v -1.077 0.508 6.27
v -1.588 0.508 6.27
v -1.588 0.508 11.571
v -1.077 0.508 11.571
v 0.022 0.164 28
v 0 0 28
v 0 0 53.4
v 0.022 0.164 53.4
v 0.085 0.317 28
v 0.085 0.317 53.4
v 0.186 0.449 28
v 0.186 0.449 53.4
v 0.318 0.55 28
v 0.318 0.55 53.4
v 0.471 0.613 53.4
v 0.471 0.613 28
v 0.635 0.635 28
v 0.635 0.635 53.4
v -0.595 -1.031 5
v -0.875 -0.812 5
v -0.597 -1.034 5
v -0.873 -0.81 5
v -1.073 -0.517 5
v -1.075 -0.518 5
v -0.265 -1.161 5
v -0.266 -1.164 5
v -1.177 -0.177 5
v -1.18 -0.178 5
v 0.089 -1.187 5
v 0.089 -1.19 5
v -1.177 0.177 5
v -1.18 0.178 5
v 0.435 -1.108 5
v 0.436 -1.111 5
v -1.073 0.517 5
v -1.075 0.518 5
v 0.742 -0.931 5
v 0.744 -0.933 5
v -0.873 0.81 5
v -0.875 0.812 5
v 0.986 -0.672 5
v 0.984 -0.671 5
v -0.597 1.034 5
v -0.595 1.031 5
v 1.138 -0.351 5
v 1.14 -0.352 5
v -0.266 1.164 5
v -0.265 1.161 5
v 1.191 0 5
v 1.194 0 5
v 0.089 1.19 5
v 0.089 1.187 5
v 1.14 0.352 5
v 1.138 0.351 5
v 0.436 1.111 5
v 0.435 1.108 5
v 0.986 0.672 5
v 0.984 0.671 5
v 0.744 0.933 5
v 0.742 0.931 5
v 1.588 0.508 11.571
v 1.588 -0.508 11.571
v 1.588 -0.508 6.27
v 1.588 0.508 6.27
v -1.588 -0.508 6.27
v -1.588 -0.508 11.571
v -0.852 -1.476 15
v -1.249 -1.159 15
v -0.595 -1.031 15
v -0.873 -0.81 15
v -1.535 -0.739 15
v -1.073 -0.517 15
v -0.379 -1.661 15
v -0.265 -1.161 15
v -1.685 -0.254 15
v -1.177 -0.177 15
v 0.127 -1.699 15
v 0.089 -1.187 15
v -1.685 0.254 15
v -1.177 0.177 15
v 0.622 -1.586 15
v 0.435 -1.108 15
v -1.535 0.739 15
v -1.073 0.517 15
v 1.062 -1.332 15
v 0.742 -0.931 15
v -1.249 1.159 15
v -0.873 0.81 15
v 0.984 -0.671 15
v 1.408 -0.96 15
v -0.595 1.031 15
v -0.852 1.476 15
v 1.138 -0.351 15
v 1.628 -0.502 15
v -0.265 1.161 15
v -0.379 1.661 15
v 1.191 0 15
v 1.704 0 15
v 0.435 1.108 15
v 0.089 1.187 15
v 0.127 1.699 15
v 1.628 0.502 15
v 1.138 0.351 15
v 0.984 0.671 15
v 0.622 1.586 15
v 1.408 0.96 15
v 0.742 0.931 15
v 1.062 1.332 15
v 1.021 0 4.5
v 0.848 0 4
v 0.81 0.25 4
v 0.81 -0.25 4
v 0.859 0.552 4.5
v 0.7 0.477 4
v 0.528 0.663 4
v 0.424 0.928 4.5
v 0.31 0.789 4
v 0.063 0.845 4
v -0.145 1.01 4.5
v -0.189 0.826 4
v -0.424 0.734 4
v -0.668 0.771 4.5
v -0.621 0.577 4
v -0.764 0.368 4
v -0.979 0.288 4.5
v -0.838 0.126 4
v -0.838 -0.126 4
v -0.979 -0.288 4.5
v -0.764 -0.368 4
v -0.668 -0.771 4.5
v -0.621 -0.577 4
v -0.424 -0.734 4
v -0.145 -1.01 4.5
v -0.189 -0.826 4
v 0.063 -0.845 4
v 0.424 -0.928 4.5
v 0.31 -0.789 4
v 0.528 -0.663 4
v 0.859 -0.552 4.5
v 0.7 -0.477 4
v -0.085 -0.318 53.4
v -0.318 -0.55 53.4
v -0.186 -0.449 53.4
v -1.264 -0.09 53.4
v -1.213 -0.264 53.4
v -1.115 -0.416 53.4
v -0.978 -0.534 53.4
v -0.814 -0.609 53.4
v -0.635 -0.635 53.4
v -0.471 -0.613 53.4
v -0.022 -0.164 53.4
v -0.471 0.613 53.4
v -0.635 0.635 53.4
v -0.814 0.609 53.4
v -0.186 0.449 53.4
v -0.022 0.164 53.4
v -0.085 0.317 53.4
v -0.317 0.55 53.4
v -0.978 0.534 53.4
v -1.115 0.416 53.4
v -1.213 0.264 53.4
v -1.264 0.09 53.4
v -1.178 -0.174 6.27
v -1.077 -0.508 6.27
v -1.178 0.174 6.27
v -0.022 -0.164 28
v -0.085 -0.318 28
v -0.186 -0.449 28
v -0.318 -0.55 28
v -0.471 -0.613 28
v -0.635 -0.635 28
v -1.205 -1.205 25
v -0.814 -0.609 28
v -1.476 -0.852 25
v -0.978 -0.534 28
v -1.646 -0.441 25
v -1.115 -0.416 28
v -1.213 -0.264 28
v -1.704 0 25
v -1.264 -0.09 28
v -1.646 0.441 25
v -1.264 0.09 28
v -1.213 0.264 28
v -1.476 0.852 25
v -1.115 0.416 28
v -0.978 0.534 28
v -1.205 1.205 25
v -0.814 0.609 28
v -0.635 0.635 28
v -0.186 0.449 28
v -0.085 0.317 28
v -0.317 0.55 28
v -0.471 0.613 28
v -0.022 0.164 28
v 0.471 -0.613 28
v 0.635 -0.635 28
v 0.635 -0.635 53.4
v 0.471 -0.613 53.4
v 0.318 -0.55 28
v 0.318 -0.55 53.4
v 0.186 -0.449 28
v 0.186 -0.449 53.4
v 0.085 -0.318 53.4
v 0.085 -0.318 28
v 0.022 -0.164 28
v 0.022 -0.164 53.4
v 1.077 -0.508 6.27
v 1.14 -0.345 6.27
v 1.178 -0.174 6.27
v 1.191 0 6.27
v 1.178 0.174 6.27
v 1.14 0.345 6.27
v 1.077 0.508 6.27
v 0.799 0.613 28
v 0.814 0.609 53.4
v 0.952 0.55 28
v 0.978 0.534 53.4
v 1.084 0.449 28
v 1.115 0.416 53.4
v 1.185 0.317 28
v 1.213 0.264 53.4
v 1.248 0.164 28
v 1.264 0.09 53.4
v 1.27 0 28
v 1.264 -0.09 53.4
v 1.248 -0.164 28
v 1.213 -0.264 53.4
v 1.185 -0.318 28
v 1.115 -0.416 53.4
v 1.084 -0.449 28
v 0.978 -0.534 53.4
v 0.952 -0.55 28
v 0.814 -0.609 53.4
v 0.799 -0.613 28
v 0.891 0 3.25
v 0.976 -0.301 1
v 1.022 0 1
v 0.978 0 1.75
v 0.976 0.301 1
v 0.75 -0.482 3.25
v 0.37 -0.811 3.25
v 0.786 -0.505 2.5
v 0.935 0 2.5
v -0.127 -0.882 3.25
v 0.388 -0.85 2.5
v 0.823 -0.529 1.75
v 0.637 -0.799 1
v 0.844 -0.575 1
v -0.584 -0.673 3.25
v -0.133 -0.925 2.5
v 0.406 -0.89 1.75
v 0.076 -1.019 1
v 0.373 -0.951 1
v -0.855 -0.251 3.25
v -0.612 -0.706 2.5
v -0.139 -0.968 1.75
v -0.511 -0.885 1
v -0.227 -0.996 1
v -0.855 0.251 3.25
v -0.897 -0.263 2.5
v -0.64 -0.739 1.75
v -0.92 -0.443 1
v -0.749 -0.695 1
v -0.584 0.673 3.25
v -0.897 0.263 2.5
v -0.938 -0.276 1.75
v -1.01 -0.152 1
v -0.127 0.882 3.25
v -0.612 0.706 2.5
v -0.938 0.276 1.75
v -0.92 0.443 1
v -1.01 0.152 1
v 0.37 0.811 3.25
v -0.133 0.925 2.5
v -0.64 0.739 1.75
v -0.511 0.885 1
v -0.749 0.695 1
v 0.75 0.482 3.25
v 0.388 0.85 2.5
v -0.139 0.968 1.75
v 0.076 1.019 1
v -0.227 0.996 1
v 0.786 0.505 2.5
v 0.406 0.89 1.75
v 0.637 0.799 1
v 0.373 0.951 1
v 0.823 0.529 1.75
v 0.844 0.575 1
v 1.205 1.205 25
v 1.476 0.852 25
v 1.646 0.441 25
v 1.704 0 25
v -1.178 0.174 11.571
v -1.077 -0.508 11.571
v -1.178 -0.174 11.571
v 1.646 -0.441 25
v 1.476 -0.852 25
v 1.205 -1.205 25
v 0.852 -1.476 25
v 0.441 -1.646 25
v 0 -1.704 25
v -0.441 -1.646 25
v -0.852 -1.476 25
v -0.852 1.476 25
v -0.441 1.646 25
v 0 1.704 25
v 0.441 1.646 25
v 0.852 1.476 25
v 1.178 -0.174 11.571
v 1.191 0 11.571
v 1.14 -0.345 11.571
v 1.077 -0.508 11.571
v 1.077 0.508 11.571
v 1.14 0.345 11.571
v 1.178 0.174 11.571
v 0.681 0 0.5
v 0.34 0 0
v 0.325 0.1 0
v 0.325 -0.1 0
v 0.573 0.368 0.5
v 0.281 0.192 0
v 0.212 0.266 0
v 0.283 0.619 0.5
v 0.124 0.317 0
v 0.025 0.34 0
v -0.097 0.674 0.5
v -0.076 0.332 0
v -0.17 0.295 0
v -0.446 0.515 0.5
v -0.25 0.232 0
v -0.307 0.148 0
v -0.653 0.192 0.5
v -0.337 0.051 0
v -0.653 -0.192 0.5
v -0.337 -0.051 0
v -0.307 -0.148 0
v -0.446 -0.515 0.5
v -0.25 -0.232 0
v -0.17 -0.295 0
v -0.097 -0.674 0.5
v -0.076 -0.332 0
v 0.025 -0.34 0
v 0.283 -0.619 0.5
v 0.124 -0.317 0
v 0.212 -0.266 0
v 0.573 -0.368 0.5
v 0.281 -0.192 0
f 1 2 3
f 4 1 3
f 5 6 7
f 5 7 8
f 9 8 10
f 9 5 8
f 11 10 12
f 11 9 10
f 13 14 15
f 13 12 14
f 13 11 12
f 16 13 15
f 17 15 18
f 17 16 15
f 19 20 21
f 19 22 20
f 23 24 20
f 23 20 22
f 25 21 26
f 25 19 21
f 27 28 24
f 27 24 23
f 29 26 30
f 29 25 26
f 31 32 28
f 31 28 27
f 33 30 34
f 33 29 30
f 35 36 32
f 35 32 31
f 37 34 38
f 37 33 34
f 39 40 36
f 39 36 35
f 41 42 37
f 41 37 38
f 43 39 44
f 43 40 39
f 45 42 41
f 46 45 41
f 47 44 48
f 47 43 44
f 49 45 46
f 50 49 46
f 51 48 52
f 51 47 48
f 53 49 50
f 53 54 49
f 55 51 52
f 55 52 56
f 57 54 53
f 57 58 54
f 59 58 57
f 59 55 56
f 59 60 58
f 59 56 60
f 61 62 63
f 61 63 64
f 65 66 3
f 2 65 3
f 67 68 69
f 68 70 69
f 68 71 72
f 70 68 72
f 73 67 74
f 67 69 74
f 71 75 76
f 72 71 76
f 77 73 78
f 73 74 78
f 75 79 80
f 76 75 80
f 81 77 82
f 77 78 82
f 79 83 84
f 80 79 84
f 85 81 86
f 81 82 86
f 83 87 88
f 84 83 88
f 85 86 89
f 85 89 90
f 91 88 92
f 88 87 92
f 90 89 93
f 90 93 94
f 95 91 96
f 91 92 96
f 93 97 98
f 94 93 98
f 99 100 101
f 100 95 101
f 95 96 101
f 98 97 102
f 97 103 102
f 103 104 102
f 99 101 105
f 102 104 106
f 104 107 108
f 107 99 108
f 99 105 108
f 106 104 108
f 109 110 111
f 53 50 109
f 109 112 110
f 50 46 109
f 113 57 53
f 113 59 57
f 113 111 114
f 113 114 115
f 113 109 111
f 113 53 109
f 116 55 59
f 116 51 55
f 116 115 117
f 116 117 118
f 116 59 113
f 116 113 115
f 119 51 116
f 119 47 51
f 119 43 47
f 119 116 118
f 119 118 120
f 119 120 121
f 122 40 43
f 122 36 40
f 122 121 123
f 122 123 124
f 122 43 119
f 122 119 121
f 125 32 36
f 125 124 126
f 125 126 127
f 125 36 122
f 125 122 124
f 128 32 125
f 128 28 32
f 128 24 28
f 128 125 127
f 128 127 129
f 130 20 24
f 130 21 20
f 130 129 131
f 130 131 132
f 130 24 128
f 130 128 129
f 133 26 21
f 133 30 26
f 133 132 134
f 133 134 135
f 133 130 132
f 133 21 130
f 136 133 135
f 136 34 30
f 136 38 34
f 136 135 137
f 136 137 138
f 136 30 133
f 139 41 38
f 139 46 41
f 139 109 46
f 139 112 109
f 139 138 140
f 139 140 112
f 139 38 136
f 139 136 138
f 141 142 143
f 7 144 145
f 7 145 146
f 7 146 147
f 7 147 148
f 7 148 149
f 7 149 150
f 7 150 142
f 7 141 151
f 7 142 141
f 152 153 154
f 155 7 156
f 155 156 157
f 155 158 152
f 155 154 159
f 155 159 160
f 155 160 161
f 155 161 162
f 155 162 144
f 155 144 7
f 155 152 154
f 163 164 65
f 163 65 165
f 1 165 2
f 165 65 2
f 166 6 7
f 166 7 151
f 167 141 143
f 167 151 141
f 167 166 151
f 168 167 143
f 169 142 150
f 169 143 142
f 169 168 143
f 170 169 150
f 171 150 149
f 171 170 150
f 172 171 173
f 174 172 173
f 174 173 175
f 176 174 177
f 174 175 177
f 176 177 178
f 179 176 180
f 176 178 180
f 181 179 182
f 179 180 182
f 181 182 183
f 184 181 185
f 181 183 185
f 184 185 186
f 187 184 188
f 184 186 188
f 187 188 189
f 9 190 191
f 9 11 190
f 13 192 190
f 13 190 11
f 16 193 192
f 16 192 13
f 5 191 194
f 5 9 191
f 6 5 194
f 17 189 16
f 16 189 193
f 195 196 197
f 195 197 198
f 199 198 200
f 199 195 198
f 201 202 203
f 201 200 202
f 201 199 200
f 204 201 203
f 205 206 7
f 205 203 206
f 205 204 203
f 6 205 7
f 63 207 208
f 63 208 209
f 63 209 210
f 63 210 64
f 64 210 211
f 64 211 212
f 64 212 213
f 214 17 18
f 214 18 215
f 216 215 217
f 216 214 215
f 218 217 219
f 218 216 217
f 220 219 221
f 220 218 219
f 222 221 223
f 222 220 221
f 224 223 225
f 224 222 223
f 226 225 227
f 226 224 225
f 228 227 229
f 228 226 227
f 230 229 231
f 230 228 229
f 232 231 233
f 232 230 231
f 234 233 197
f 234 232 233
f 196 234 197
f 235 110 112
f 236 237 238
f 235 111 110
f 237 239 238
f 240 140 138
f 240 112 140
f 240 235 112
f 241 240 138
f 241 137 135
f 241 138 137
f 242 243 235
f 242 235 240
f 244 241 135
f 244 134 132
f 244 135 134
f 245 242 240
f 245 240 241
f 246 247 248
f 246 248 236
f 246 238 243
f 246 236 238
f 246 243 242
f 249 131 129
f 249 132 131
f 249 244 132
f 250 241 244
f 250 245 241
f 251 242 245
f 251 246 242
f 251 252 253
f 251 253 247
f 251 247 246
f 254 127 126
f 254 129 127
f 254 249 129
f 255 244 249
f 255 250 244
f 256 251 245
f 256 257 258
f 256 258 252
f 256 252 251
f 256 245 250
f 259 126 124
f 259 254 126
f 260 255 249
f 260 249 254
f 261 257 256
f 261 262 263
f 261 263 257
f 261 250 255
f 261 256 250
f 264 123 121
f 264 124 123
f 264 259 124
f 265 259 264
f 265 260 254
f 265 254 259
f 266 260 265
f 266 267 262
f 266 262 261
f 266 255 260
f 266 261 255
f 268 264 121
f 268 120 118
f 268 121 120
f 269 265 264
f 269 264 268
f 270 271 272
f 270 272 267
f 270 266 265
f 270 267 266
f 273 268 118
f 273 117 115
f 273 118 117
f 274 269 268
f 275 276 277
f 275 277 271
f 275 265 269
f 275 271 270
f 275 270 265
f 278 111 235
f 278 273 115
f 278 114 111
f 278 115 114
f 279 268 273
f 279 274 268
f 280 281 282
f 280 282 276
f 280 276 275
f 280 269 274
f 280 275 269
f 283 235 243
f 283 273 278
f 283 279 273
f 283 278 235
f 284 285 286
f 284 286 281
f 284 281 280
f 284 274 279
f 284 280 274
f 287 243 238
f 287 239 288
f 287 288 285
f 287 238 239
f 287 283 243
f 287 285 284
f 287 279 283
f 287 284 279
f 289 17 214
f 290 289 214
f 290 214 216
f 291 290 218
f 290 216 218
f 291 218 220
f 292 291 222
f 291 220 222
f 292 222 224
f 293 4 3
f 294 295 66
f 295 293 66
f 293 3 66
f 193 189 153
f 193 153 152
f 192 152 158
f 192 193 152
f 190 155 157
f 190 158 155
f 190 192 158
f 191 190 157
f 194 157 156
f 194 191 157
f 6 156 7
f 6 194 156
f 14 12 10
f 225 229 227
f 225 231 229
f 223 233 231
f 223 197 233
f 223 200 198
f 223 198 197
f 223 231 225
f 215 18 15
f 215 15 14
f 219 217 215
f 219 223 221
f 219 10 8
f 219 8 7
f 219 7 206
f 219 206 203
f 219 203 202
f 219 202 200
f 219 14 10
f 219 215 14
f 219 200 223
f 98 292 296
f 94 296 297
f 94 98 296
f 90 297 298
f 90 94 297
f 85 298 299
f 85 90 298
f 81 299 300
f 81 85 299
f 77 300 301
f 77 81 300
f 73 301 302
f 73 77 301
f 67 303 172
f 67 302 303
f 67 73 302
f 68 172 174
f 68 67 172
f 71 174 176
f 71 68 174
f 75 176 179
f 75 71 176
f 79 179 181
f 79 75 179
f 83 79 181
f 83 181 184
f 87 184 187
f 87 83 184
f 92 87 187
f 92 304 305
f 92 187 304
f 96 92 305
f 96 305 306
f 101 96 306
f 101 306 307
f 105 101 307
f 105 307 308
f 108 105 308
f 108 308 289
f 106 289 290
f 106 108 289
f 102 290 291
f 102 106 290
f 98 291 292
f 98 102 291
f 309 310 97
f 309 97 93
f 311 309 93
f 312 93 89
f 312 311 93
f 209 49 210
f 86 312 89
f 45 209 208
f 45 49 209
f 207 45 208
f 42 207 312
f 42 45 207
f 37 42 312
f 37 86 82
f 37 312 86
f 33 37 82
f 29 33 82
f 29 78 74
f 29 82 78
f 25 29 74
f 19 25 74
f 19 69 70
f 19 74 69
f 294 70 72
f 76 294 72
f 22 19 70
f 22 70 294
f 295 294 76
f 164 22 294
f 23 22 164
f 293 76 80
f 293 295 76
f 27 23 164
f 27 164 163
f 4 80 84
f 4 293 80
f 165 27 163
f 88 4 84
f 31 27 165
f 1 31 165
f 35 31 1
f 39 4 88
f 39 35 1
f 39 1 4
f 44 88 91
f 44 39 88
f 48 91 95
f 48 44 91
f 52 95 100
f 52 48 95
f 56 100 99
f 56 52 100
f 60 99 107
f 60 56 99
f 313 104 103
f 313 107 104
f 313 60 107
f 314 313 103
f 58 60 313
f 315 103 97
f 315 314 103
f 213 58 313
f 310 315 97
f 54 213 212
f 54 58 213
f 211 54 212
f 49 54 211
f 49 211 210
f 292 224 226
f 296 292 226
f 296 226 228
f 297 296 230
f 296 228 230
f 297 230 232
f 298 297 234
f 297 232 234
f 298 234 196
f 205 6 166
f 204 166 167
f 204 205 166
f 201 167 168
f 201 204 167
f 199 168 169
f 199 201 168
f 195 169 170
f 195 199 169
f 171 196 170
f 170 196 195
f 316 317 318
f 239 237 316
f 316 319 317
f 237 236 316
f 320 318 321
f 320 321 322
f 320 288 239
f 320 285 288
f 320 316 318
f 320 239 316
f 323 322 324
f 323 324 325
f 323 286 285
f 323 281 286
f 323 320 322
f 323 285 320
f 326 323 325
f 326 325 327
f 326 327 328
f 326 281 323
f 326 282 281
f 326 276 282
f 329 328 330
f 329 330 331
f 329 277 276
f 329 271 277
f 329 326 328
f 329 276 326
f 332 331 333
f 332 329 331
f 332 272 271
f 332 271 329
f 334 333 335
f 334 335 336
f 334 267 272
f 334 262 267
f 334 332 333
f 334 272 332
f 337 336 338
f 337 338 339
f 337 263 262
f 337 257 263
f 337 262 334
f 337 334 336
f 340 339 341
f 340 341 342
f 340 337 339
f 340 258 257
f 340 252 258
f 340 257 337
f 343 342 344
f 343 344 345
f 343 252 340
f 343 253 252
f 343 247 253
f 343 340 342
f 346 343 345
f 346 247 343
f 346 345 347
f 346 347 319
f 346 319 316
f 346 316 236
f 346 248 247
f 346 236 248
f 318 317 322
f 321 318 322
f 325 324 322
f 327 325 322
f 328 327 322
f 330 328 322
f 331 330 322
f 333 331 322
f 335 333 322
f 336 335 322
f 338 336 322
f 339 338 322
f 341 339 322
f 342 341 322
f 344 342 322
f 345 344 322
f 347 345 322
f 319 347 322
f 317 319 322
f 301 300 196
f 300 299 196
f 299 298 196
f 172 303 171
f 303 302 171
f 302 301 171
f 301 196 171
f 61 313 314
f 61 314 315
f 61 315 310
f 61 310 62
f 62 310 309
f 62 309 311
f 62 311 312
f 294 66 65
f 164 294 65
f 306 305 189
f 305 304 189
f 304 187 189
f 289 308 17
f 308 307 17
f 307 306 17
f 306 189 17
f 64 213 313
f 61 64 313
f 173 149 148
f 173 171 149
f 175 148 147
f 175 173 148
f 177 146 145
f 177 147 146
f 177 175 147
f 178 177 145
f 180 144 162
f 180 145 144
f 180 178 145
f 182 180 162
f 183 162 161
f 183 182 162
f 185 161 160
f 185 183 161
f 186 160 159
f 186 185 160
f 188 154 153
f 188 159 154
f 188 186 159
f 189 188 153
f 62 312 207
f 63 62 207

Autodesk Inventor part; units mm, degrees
sketch "Sketch1" plane through (0, 0, 0) normal (0, 0, 1) x (1, 0, 0)
  circle A0 centre (0, 0) radius 0.3405
  dimension "d0" = 0.681
ref_plane "Work Plane1" through (0, 0, 1) normal (0, 0, 1) x (1, 0, 0)
sketch "Sketch2" plane through (0, 0, 1) normal (0, 0, 1) x (1, 0, 0)
  circle A0 centre (0, 0) radius 1.0215
  dimension "d2" = 2.043
ref_plane "Work Plane2" through (0, 0, 4) normal (0, 0, 1) x (1, 0, 0)
sketch "Sketch3" plane through (0, 0, 4) normal (0, 0, 1) x (1, 0, 0)
  circle A0 centre (0, 0) radius 0.8476
  dimension "d4" = 1.6951
ref_plane "Work Plane3" through (0, 0, 5) normal (0, 0, 1) x (1, 0, 0)
sketch "Sketch4" plane through (0, 0, 5) normal (0, 0, 1) x (1, 0, 0)
  circle A0 centre (0, 0) radius 1.1935
  dimension "d6" = 2.387
loft "Loft1" add profiles "Sketch4", "Sketch3"
loft "Loft2" add profiles "Sketch2" section 1 edges at (-0.8476, 0, 4)
loft "Loft3" add profiles "Sketch1" section 2 edges at (-1.0215, 0, 1)
sketch "Sketch5" plane through (0, 0, 5) normal (0, 0, 1) x (1, 0, 0)
  circle A0 centre (0, 0) radius 1.1906
  dimension "d35" = 2.3813
extrude "Extrusion1" add sketch "Sketch5" along normal blind 10
sketch "Sketch6" plane through (0, 0, 15) normal (0, 0, 1) x (1, 0, 0)
  circle A0 centre (0, 0) radius 1.7038
  dimension "d21" = 3.4076
extrude "Extrusion2" add sketch "Sketch6" along normal blind 10
ref_plane "Work Plane4" through (0, 0, 28) normal (0, 0, 1) x (1, 0, 0)
sketch "Sketch7" plane through (0, 0, 28) normal (0, 0, 1) x (1, 0, 0)
  arc A0 (-0.635, 0.635) -> (-0.635, -0.635) centre (-0.635, 0) ccw
  arc A1 (0.635, -0.635) -> (0.635, 0.635) centre (0.635, 0) ccw
  line L0 (-0.635, 0.635) -> (0.635, 0.635)
  line L1 (0.635, -0.635) -> (-0.635, -0.635)
loft "Loft4" add profiles "Sketch7" section 1 edges at (-1.7038, 0, 25)
sketch "Sketch8" plane through (0, 0, 28) normal (0, 0, 1) x (1, 0, 0)
  arc A0 (-0.635, 0.635) -> (-0.635, -0.635) centre (-0.635, 0) ccw projected
  circle A1 centre (-0.635, 0) radius 0.635
  arc A2 (0.635, -0.635) -> (0.635, 0.635) centre (0.635, 0) ccw projected
  circle A3 centre (0.635, 0) radius 0.635
  point P0 (0, 0)
extrude "Extrusion3" add sketch "Sketch8" along normal blind 25.4
ref_plane "Work Plane5" through (0, 0, 0) normal (1, 0, 0) x (0, 1, 0)
sketch "Sketch9" plane through (0, 0, 0) normal (1, 0, 0) x (0, 1, 0)
  line L0 (0.508, 11.571) -> (-0.508, 11.571)
  line L1 (-0.508, 11.571) -> (-0.508, 6.27)
  line L2 (-0.508, 6.27) -> (0.508, 6.27)
  line L3 (0.508, 6.27) -> (0.508, 11.571)
  line L4 (-1.7038, 15) -> (1.7038, 15) projected
  line L5 (-1.1935, 5) -> (1.1935, 5) projected
  point P0 (0, 0)
  dimension "d37" = 0.508
  dimension "d38" = 0.508
  dimension "d39" = 3.429
  dimension "d40" = 1.27
extrude "Extrusion4" add sketch "Sketch9" along normal mid plane 3.175
properties part number "Snap-Twist Idea M"
